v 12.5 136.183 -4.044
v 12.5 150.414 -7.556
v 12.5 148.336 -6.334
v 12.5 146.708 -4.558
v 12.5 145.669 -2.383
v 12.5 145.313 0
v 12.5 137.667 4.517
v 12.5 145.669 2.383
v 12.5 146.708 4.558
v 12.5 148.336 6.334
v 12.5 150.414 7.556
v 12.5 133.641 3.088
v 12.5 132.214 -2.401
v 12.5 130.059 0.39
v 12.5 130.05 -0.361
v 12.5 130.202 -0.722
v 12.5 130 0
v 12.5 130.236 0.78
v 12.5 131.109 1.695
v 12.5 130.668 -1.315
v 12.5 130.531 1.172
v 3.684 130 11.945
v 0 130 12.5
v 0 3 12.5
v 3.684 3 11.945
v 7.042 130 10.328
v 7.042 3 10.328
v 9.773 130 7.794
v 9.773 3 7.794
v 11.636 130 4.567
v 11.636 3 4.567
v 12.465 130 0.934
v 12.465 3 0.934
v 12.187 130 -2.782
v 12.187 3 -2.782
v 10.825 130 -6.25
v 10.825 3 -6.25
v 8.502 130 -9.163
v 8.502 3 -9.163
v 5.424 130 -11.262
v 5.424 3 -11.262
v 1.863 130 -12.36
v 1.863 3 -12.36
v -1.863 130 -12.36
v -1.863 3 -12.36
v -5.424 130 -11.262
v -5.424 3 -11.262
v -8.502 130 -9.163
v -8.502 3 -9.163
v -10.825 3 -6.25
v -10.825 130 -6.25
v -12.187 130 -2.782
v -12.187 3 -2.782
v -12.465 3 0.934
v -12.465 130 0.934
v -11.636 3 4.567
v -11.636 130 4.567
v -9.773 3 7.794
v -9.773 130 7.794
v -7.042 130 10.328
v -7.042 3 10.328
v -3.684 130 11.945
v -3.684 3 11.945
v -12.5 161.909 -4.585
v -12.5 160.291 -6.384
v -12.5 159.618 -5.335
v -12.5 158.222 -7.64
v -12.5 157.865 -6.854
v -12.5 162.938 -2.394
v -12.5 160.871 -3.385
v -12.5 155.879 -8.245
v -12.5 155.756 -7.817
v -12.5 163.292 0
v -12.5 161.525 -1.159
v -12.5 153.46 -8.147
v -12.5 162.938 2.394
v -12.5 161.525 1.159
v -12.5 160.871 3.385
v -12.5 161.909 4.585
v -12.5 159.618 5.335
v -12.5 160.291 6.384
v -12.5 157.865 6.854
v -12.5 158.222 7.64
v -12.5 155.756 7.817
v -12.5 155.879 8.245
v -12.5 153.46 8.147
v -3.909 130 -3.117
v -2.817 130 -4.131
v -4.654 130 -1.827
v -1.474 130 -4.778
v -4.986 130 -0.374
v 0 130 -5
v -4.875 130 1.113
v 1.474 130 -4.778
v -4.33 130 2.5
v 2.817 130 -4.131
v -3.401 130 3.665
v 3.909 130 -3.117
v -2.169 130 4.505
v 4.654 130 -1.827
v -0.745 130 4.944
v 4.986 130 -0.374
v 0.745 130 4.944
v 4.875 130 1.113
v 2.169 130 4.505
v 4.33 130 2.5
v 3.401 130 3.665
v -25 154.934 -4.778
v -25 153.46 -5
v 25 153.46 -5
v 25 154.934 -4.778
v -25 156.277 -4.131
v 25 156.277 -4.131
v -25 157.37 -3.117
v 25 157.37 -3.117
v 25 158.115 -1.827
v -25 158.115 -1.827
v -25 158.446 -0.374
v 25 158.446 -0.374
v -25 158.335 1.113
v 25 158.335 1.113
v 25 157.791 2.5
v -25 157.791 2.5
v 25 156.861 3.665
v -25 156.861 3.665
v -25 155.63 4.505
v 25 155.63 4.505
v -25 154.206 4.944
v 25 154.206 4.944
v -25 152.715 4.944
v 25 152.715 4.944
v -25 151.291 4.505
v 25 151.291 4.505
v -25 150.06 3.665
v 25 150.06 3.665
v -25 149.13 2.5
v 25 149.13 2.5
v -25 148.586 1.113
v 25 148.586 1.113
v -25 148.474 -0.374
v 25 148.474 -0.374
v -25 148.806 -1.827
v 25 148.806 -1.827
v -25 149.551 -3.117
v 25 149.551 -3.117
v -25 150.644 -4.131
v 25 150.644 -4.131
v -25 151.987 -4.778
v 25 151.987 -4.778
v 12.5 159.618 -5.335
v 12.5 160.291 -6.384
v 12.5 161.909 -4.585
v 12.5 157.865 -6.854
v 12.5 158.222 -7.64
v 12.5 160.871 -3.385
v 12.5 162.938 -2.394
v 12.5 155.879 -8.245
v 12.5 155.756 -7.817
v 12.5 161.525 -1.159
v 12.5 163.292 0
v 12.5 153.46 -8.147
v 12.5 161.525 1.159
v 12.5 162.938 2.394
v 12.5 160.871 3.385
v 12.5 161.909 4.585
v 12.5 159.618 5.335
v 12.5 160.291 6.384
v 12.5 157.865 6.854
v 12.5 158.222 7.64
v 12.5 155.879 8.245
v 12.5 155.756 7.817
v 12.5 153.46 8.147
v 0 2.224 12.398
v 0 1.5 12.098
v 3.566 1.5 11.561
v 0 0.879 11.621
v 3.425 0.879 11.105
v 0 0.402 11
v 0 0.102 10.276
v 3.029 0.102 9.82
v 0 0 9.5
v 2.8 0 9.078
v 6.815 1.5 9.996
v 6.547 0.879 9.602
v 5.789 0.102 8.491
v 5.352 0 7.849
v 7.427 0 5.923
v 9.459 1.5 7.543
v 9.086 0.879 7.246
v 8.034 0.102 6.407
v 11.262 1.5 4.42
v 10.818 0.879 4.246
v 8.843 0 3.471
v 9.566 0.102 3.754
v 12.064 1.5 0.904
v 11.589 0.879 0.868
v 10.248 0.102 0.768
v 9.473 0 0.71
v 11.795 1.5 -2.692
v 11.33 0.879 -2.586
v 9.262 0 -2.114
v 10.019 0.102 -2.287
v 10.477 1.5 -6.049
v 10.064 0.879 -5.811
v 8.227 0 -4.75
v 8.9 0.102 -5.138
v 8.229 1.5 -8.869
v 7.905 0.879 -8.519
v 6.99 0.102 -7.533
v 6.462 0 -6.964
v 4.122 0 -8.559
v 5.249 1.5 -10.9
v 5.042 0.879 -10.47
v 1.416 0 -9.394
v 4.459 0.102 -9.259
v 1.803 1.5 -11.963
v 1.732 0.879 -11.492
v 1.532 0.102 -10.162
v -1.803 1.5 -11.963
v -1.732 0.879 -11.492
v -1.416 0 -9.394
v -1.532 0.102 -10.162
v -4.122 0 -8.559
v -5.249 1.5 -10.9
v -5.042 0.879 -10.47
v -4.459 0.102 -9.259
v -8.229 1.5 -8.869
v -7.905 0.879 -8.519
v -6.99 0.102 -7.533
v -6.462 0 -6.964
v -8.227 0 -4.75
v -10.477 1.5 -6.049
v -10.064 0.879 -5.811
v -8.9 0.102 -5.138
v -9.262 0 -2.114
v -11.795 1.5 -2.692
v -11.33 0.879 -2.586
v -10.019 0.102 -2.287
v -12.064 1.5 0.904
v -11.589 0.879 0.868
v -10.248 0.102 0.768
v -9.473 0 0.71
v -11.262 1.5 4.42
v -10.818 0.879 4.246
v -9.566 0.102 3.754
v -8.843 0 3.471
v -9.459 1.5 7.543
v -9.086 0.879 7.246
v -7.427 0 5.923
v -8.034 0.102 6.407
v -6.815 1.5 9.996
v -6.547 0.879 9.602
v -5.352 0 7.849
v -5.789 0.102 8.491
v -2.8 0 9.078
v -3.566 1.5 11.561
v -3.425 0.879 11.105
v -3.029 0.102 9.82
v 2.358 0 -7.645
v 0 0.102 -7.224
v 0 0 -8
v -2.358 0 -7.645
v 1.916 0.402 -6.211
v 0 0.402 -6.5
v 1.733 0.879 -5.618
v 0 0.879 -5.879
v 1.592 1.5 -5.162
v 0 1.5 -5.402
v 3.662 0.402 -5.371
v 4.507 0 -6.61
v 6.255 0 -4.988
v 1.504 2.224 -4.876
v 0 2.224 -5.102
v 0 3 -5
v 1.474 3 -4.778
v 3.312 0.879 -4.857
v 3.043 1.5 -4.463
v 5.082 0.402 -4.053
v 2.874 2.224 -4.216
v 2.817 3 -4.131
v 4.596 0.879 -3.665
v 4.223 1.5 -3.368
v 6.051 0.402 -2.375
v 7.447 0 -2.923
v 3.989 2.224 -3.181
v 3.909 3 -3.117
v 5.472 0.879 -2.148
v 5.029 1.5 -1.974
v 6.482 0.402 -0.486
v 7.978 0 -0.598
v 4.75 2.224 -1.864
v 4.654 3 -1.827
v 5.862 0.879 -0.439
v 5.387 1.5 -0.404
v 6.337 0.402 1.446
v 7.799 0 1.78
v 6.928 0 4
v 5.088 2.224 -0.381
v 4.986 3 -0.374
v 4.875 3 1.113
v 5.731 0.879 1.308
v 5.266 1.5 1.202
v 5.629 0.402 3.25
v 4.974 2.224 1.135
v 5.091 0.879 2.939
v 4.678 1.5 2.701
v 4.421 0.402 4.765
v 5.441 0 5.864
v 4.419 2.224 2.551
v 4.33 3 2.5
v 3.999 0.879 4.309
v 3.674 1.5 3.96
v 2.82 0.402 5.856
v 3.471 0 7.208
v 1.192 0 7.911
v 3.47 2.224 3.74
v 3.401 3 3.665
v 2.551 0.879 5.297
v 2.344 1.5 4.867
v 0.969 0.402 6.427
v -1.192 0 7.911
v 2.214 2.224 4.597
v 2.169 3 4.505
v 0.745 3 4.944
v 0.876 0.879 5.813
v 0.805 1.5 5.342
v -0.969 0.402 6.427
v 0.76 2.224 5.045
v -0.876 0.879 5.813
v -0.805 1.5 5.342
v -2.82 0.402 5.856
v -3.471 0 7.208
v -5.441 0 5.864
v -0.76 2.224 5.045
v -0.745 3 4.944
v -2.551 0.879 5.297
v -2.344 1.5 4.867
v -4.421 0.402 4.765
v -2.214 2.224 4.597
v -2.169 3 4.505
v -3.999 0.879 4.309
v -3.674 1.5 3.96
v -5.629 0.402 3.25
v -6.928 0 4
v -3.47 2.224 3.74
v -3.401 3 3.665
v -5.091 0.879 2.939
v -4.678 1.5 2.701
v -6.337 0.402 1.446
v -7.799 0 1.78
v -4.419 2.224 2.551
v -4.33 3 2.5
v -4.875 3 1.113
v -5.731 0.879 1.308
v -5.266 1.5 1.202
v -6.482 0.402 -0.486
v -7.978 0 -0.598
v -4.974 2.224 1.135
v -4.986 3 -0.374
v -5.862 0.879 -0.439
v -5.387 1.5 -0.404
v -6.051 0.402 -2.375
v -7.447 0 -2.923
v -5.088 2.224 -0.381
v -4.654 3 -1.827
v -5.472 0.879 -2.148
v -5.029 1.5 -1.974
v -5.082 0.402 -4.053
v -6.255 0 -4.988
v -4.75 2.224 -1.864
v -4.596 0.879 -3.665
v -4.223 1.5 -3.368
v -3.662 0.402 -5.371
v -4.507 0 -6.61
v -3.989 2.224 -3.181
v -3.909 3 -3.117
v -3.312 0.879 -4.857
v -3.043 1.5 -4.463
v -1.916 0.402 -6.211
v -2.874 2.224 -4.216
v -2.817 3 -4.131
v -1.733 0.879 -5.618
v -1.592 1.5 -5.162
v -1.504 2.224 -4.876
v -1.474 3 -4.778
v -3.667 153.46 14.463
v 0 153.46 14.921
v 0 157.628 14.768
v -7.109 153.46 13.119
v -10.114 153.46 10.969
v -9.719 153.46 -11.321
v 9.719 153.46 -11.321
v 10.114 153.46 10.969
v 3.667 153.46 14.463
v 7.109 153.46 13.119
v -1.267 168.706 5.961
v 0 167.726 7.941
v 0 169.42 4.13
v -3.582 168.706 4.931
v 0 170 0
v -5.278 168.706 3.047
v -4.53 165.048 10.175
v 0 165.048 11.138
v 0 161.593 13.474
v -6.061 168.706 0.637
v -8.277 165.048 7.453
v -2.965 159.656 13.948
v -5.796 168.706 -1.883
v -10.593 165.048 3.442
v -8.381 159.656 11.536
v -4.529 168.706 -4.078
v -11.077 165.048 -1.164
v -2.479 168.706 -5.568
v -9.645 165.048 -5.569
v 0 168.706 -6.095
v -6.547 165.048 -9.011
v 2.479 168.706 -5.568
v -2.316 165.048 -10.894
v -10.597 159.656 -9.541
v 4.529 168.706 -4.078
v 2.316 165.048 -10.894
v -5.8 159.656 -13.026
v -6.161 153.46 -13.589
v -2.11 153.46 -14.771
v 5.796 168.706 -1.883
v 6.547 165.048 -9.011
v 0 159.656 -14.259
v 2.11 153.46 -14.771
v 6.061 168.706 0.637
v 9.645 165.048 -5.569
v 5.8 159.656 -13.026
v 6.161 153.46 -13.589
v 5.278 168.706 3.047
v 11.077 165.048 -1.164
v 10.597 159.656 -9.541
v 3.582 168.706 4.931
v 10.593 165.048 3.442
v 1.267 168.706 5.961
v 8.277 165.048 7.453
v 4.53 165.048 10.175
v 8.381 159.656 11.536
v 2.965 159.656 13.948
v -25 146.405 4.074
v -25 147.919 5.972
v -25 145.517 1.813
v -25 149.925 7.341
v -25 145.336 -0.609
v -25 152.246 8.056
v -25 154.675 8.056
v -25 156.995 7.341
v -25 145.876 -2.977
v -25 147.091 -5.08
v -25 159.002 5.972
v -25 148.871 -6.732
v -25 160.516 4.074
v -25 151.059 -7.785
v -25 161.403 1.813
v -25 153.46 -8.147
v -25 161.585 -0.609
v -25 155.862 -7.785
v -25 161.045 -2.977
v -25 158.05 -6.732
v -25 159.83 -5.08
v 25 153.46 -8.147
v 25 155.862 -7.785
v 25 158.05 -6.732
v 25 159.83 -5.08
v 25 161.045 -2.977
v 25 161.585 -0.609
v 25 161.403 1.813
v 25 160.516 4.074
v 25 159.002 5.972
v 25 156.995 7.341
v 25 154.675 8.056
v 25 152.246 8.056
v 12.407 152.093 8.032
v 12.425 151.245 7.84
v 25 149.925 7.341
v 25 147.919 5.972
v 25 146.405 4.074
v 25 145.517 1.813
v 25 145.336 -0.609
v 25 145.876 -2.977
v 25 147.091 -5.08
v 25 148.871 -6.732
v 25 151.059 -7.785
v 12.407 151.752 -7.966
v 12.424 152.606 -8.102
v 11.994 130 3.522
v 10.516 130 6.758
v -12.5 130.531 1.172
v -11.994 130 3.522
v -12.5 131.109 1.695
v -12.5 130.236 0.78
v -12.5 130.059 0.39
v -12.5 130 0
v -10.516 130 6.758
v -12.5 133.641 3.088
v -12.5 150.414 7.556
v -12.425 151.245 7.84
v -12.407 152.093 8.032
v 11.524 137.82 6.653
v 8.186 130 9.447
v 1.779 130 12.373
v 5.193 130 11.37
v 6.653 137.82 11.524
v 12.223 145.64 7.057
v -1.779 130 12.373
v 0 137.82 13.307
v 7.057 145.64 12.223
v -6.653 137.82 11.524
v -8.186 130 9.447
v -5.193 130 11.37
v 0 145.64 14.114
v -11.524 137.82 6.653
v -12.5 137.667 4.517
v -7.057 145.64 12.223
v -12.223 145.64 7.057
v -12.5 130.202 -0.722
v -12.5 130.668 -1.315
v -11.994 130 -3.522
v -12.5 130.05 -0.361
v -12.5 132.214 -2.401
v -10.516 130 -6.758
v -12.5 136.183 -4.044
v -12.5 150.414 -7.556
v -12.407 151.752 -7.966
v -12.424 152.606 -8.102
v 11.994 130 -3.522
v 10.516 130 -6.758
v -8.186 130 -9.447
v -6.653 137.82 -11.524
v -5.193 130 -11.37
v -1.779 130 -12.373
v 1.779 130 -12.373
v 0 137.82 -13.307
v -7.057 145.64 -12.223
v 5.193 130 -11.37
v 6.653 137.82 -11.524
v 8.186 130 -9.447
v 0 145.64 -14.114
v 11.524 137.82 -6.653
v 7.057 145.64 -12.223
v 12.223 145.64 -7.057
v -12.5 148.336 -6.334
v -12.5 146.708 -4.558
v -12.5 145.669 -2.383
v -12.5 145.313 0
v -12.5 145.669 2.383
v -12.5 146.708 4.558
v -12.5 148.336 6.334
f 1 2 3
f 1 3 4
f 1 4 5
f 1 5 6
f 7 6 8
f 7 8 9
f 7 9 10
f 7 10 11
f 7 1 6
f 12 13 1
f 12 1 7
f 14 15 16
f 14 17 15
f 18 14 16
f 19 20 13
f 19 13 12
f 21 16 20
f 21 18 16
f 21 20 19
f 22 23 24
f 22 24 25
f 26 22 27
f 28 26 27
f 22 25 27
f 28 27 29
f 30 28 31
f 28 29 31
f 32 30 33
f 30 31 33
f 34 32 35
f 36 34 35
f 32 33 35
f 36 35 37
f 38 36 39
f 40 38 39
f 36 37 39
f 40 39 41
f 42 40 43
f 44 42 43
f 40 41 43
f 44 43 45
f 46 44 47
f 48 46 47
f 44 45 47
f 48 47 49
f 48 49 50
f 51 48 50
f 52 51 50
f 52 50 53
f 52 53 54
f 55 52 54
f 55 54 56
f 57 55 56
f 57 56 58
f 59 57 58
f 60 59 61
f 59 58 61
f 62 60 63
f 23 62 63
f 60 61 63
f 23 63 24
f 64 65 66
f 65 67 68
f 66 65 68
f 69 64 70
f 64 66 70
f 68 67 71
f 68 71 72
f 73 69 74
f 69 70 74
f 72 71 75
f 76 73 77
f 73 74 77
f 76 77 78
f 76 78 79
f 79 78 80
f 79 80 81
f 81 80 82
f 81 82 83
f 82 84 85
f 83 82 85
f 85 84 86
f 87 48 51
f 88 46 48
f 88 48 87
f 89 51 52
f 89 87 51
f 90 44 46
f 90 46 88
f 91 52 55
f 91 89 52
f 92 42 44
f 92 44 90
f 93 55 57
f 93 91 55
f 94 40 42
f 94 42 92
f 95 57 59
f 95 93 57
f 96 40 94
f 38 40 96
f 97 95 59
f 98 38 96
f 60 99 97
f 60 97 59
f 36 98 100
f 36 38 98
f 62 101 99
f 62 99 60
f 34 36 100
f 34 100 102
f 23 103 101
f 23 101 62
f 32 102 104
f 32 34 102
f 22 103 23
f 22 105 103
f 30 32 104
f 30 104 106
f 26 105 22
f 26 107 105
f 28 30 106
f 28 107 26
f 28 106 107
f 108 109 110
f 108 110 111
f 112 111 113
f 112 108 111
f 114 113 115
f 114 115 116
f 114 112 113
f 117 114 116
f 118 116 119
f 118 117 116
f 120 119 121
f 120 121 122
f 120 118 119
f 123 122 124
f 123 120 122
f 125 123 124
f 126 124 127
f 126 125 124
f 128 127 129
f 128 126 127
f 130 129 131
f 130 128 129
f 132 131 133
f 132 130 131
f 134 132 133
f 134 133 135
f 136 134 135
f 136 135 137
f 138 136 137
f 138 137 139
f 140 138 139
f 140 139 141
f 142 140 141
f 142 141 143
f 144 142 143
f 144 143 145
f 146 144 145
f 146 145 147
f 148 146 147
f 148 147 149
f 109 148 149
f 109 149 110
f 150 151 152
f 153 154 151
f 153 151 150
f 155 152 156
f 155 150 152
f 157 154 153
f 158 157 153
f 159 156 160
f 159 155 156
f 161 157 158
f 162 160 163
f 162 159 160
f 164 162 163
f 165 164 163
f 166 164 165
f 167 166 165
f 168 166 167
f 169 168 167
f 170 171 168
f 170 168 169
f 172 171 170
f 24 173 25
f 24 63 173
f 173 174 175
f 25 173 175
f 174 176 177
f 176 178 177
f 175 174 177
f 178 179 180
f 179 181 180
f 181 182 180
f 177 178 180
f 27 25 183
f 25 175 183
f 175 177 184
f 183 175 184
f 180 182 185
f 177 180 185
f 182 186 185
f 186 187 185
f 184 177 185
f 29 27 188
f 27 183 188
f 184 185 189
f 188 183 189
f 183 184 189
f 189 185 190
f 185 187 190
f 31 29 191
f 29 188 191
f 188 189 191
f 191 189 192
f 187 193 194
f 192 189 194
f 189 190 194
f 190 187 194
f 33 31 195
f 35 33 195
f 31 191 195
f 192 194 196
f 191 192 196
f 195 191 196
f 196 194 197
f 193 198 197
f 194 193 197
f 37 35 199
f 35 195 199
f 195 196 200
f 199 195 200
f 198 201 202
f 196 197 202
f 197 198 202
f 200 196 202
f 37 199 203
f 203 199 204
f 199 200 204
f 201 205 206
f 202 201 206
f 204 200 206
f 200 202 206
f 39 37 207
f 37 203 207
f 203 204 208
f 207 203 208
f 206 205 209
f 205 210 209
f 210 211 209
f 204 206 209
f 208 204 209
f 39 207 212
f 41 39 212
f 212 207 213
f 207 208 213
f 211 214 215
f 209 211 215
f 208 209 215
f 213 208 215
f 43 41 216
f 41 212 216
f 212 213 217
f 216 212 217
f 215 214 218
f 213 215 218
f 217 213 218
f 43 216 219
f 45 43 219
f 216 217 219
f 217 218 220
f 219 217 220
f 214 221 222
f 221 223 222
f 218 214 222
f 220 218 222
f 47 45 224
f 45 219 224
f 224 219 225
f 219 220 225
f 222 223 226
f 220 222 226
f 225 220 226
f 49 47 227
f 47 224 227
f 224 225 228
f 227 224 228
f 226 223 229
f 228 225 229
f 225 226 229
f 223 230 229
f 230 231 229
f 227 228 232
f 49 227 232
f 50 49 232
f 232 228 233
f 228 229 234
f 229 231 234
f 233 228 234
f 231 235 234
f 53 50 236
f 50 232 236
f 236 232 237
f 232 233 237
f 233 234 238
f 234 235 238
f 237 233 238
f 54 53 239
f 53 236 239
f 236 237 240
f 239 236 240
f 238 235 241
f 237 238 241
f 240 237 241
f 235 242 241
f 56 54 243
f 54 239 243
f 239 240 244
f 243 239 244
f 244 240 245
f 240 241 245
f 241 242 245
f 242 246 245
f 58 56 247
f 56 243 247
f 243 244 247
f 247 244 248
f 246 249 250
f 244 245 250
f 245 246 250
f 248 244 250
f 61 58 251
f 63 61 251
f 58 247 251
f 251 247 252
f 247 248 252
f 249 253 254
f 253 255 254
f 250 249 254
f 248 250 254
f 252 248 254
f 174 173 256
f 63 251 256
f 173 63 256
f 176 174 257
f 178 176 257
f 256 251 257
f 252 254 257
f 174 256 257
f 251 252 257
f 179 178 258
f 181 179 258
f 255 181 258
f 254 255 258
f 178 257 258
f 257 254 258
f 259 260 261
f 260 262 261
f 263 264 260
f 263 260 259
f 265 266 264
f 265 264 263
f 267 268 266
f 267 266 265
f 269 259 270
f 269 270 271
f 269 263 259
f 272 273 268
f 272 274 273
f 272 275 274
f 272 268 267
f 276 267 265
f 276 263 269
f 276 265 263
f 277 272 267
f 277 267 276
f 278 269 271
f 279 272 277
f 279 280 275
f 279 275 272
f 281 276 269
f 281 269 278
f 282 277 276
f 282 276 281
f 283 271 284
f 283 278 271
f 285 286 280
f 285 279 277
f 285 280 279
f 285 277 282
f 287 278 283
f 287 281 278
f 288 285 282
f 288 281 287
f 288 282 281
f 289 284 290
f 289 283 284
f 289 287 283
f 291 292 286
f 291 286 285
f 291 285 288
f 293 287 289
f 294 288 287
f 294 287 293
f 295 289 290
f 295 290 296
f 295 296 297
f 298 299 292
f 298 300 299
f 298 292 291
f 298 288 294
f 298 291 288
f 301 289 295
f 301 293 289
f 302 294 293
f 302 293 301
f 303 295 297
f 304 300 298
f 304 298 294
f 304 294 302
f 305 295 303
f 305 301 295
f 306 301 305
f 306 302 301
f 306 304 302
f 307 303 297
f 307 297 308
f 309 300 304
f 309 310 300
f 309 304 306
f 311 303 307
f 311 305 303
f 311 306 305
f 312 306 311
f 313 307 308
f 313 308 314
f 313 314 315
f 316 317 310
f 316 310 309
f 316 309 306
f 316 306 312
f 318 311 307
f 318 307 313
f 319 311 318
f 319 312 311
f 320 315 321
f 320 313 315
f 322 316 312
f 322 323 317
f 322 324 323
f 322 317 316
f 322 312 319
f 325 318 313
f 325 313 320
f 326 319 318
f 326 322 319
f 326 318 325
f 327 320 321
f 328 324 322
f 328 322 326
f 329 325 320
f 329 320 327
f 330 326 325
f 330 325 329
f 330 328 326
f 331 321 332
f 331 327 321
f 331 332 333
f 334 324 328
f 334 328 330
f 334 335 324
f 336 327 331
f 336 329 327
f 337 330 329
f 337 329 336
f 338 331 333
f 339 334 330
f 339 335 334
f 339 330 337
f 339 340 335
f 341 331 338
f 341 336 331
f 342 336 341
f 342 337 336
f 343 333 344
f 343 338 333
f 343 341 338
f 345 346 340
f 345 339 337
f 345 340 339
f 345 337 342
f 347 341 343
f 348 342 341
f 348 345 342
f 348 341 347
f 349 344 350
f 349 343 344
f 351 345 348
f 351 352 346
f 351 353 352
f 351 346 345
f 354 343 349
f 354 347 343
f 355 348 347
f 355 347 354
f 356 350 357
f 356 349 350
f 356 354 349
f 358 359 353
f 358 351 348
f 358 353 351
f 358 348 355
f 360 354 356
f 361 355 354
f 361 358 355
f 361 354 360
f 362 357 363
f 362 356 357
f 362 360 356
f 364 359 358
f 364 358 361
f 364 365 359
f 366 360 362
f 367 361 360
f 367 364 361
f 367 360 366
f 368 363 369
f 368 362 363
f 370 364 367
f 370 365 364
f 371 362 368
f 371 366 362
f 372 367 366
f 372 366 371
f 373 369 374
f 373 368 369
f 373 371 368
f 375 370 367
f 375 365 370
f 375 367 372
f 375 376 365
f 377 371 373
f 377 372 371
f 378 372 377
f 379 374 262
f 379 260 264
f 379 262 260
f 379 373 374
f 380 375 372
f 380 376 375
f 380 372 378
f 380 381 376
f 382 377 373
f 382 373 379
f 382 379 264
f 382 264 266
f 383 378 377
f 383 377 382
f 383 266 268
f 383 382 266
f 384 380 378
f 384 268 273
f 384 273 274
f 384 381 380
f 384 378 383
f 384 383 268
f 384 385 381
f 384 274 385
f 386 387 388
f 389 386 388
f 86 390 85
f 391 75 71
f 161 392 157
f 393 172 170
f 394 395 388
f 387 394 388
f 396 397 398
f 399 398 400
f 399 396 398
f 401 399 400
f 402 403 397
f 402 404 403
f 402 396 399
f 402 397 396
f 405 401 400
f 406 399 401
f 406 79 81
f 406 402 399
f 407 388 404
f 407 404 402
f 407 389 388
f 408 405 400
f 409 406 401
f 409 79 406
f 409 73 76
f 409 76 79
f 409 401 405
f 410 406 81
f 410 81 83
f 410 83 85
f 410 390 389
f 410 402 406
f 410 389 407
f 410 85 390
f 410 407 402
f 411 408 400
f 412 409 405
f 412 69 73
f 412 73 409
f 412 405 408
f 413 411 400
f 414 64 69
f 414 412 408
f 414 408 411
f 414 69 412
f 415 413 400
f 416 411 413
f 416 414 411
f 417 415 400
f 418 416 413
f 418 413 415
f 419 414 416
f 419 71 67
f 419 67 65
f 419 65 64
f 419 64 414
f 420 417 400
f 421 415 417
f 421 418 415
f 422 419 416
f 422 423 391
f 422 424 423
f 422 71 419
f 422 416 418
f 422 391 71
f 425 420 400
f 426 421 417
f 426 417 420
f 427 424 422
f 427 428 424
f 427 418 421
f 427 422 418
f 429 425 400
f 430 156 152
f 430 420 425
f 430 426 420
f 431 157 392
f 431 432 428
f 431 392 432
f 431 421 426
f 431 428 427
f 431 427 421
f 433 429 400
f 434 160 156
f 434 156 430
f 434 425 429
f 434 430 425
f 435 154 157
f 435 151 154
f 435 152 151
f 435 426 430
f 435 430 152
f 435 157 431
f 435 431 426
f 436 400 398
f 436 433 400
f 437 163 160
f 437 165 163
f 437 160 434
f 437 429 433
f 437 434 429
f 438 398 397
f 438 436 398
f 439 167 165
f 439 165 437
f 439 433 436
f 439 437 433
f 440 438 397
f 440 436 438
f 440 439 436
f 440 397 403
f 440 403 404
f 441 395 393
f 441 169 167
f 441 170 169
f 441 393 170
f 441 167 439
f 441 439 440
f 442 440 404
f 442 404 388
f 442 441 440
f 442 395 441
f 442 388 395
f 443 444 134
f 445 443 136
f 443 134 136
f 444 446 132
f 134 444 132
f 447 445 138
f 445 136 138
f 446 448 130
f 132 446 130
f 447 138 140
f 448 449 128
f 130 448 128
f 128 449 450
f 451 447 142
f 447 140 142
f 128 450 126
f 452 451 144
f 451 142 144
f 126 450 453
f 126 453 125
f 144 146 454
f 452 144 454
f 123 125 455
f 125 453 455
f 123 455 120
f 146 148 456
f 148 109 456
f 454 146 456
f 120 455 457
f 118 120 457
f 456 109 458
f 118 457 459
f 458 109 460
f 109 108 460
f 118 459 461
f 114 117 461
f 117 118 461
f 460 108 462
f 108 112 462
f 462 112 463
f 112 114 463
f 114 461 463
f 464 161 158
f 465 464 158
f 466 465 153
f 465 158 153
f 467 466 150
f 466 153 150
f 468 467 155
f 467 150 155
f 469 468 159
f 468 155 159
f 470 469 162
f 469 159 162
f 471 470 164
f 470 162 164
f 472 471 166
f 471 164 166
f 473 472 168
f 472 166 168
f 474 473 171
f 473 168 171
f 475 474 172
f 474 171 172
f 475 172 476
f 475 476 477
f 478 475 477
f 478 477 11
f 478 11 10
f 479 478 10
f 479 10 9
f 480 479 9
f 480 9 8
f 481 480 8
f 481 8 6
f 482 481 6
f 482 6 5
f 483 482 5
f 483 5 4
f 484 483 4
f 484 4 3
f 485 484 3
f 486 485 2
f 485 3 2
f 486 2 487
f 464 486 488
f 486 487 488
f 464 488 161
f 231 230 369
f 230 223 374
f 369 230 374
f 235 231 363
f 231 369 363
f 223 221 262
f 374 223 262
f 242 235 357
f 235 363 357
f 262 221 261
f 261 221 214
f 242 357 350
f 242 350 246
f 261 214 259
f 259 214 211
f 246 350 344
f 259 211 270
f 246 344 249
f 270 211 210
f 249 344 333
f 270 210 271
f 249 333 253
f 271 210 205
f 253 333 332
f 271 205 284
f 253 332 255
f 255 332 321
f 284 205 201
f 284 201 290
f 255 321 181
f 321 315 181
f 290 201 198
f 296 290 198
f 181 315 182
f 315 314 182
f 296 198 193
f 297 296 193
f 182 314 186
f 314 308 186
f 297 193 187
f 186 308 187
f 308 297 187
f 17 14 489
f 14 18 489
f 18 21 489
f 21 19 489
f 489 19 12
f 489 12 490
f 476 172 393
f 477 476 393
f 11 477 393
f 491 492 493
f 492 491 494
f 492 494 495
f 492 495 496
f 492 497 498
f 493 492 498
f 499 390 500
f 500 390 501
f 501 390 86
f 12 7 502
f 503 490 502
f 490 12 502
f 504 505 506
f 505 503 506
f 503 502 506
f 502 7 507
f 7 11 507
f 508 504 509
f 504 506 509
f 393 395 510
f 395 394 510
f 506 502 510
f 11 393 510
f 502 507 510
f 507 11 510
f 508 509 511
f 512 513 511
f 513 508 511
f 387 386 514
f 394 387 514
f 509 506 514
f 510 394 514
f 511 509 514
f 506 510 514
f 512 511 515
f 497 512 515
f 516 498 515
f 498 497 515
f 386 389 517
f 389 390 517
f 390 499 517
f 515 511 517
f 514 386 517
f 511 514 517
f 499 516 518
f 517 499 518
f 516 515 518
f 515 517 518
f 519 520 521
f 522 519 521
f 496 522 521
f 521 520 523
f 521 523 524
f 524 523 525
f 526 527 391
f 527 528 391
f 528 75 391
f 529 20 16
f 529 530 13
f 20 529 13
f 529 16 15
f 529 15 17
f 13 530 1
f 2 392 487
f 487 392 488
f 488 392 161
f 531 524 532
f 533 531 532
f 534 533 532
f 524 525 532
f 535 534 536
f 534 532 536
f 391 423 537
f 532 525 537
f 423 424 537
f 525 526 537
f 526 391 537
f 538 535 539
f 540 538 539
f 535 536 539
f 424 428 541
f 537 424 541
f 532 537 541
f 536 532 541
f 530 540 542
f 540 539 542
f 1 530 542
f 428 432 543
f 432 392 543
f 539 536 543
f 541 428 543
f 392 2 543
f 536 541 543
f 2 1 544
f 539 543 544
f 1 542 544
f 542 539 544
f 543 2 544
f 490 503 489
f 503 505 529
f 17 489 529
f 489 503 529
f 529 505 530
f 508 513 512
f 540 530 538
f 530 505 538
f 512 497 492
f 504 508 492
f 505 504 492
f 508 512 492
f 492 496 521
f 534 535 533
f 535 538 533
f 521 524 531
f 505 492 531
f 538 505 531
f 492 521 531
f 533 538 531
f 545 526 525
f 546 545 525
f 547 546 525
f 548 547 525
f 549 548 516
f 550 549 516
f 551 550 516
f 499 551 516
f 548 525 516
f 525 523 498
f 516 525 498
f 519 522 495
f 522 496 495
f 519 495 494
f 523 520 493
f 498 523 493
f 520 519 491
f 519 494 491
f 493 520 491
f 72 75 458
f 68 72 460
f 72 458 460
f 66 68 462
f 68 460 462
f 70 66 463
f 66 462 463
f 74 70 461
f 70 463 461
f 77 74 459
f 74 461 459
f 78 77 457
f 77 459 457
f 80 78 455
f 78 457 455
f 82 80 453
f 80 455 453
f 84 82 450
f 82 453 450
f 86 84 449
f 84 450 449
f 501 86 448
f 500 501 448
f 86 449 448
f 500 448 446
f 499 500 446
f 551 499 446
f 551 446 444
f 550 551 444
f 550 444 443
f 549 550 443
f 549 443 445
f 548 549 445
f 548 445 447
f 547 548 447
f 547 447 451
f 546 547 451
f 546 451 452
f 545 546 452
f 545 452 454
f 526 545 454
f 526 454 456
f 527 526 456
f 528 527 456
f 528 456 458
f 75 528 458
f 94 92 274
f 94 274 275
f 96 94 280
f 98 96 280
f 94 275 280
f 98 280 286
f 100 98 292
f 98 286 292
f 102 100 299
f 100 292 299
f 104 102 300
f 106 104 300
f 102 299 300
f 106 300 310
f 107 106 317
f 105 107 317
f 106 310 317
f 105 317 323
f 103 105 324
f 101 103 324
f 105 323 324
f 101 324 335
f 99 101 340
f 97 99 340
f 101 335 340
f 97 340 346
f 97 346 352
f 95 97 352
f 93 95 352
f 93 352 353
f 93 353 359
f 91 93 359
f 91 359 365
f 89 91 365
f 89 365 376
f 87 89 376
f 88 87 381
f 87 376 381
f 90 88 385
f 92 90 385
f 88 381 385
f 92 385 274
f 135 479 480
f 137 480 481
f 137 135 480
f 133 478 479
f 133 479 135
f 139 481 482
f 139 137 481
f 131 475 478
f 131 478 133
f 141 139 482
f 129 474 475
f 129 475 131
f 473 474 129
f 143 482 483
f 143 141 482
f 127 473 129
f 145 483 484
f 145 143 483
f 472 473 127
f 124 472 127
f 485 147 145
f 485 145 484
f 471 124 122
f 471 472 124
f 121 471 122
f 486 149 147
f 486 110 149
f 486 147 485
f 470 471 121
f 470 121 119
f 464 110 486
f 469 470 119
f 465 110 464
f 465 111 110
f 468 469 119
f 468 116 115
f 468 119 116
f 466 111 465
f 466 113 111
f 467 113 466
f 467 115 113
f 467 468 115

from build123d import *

# Parameters (mm, degrees)
SZKIC1_R                         = 12.5
DODANIE_WYCI_GNI_CIE1_DEPTH      = 130
SZKIC3_W                         = 5
SZKIC3_H                         = 30
WYTNIJ_WYCI_GNI_CIE1_DEPTH       = 172.31841699
SZKIC4_R                         = 5
WYTNIJ_WYCI_GNI_CIE2_DEPTH       = 173.481883107
SZKIC5_R                         = 5
WYTNIJ_WYCI_GNI_CIE3_DEPTH       = 130
ZAOKR_GLENIE1_R                  = 3
DODANIE_WYCI_GNI_CIE2_DEPTH      = 25
DODANIE_WYCI_GNI_CIE2_DEPTH_BACK = 25
SZKIC6_R                         = 8.147367488
SZKIC6_R_2                       = 5


with BuildPart() as part:
    # Szkic1 → Dodanie-wyciągnięcie1 (new body)
    with BuildSketch(Plane(origin=(0, 0, 0), x_dir=(1, 0, 0), z_dir=(0, 1, 0))):
        with Locations(Location((0, 0, 0), (0, 0, 270))):
            Circle(SZKIC1_R)
    extrude(amount=DODANIE_WYCI_GNI_CIE1_DEPTH)

    # Szkic5 → Wytnij-wyciągnięcie3 (cut)
    with BuildSketch(Plane.XZ):
        with Locations(Location((0, 0, 0), (0, 0, 270))):
            Circle(SZKIC5_R)
    extrude(amount=-WYTNIJ_WYCI_GNI_CIE3_DEPTH, mode=Mode.SUBTRACT)

    # Zaokrąglenie1
    zaokr_glenie1_edges = [part.edges().sort_by_distance(p)[0] for p in [
        (0, 0, -12.5),
        (0, 0, 5),
    ]]
    fillet(zaokr_glenie1_edges, radius=ZAOKR_GLENIE1_R)


with BuildPart() as body_2:
    # Szkic2 → Obrót1 (revolve)
    with BuildSketch(Plane(origin=(0, 0, 0), x_dir=(0, 0, -1), z_dir=(1, 0, 0)), mode=Mode.PRIVATE) as obr_t1_sk:
        with BuildLine():
            ThreePointArc((0, 170), (15, 155), (0, 140))
            Line((0, 140), (0, 170))
        make_face()
        with BuildLine():
            Line((0, 130), (12.5, 130))
            Line((12.5, 130), (14.920777358, 153.460388679))
            ThreePointArc((14.920777358, 153.460388679), (10.047532786, 143.8623573), (0, 140))
            Line((0, 140), (0, 130))
        make_face()
    revolve(obr_t1_sk.sketch.rotate(Axis((0, 182.123097576, 0), (0, -1, 0)), 180), axis=Axis((0, 182.123097576, 0), (0, -1, 0)))

    # Szkic3 → Wytnij-wyciągnięcie1 (cut, through all)
    with BuildSketch(Plane.XZ):
        with Locations((-15, 0)):
            Rectangle(SZKIC3_W, SZKIC3_H)
        with Locations((15, 0)):
            Rectangle(SZKIC3_W, SZKIC3_H)
    extrude(amount=-WYTNIJ_WYCI_GNI_CIE1_DEPTH, mode=Mode.SUBTRACT)

    # Szkic4 → Wytnij-wyciągnięcie2 (cut, through all)
    with BuildSketch(Plane(origin=(12.5, 0, 0), x_dir=(0, 0, -1), z_dir=(1, 0, 0))):
        with Locations((0, 153.460388679)):
            Circle(SZKIC4_R)
    extrude(amount=-WYTNIJ_WYCI_GNI_CIE2_DEPTH, mode=Mode.SUBTRACT)

    # Szkic6 → Dodanie-wyciągnięcie2 (add, two sides: drawn at the far end of the back side and taken through both)
    with BuildSketch(Plane(origin=(0, 0, 0), x_dir=(0, 0, -1), z_dir=(1, 0, 0)).offset(-DODANIE_WYCI_GNI_CIE2_DEPTH_BACK)):
        with Locations((0, 153.460388679)):
            Circle(SZKIC6_R)
        with Locations((0, 153.460388679)):
            Circle(SZKIC6_R_2, mode=Mode.SUBTRACT)
    extrude(amount=DODANIE_WYCI_GNI_CIE2_DEPTH + DODANIE_WYCI_GNI_CIE2_DEPTH_BACK)


solid = Compound([part.part, body_2.part])
